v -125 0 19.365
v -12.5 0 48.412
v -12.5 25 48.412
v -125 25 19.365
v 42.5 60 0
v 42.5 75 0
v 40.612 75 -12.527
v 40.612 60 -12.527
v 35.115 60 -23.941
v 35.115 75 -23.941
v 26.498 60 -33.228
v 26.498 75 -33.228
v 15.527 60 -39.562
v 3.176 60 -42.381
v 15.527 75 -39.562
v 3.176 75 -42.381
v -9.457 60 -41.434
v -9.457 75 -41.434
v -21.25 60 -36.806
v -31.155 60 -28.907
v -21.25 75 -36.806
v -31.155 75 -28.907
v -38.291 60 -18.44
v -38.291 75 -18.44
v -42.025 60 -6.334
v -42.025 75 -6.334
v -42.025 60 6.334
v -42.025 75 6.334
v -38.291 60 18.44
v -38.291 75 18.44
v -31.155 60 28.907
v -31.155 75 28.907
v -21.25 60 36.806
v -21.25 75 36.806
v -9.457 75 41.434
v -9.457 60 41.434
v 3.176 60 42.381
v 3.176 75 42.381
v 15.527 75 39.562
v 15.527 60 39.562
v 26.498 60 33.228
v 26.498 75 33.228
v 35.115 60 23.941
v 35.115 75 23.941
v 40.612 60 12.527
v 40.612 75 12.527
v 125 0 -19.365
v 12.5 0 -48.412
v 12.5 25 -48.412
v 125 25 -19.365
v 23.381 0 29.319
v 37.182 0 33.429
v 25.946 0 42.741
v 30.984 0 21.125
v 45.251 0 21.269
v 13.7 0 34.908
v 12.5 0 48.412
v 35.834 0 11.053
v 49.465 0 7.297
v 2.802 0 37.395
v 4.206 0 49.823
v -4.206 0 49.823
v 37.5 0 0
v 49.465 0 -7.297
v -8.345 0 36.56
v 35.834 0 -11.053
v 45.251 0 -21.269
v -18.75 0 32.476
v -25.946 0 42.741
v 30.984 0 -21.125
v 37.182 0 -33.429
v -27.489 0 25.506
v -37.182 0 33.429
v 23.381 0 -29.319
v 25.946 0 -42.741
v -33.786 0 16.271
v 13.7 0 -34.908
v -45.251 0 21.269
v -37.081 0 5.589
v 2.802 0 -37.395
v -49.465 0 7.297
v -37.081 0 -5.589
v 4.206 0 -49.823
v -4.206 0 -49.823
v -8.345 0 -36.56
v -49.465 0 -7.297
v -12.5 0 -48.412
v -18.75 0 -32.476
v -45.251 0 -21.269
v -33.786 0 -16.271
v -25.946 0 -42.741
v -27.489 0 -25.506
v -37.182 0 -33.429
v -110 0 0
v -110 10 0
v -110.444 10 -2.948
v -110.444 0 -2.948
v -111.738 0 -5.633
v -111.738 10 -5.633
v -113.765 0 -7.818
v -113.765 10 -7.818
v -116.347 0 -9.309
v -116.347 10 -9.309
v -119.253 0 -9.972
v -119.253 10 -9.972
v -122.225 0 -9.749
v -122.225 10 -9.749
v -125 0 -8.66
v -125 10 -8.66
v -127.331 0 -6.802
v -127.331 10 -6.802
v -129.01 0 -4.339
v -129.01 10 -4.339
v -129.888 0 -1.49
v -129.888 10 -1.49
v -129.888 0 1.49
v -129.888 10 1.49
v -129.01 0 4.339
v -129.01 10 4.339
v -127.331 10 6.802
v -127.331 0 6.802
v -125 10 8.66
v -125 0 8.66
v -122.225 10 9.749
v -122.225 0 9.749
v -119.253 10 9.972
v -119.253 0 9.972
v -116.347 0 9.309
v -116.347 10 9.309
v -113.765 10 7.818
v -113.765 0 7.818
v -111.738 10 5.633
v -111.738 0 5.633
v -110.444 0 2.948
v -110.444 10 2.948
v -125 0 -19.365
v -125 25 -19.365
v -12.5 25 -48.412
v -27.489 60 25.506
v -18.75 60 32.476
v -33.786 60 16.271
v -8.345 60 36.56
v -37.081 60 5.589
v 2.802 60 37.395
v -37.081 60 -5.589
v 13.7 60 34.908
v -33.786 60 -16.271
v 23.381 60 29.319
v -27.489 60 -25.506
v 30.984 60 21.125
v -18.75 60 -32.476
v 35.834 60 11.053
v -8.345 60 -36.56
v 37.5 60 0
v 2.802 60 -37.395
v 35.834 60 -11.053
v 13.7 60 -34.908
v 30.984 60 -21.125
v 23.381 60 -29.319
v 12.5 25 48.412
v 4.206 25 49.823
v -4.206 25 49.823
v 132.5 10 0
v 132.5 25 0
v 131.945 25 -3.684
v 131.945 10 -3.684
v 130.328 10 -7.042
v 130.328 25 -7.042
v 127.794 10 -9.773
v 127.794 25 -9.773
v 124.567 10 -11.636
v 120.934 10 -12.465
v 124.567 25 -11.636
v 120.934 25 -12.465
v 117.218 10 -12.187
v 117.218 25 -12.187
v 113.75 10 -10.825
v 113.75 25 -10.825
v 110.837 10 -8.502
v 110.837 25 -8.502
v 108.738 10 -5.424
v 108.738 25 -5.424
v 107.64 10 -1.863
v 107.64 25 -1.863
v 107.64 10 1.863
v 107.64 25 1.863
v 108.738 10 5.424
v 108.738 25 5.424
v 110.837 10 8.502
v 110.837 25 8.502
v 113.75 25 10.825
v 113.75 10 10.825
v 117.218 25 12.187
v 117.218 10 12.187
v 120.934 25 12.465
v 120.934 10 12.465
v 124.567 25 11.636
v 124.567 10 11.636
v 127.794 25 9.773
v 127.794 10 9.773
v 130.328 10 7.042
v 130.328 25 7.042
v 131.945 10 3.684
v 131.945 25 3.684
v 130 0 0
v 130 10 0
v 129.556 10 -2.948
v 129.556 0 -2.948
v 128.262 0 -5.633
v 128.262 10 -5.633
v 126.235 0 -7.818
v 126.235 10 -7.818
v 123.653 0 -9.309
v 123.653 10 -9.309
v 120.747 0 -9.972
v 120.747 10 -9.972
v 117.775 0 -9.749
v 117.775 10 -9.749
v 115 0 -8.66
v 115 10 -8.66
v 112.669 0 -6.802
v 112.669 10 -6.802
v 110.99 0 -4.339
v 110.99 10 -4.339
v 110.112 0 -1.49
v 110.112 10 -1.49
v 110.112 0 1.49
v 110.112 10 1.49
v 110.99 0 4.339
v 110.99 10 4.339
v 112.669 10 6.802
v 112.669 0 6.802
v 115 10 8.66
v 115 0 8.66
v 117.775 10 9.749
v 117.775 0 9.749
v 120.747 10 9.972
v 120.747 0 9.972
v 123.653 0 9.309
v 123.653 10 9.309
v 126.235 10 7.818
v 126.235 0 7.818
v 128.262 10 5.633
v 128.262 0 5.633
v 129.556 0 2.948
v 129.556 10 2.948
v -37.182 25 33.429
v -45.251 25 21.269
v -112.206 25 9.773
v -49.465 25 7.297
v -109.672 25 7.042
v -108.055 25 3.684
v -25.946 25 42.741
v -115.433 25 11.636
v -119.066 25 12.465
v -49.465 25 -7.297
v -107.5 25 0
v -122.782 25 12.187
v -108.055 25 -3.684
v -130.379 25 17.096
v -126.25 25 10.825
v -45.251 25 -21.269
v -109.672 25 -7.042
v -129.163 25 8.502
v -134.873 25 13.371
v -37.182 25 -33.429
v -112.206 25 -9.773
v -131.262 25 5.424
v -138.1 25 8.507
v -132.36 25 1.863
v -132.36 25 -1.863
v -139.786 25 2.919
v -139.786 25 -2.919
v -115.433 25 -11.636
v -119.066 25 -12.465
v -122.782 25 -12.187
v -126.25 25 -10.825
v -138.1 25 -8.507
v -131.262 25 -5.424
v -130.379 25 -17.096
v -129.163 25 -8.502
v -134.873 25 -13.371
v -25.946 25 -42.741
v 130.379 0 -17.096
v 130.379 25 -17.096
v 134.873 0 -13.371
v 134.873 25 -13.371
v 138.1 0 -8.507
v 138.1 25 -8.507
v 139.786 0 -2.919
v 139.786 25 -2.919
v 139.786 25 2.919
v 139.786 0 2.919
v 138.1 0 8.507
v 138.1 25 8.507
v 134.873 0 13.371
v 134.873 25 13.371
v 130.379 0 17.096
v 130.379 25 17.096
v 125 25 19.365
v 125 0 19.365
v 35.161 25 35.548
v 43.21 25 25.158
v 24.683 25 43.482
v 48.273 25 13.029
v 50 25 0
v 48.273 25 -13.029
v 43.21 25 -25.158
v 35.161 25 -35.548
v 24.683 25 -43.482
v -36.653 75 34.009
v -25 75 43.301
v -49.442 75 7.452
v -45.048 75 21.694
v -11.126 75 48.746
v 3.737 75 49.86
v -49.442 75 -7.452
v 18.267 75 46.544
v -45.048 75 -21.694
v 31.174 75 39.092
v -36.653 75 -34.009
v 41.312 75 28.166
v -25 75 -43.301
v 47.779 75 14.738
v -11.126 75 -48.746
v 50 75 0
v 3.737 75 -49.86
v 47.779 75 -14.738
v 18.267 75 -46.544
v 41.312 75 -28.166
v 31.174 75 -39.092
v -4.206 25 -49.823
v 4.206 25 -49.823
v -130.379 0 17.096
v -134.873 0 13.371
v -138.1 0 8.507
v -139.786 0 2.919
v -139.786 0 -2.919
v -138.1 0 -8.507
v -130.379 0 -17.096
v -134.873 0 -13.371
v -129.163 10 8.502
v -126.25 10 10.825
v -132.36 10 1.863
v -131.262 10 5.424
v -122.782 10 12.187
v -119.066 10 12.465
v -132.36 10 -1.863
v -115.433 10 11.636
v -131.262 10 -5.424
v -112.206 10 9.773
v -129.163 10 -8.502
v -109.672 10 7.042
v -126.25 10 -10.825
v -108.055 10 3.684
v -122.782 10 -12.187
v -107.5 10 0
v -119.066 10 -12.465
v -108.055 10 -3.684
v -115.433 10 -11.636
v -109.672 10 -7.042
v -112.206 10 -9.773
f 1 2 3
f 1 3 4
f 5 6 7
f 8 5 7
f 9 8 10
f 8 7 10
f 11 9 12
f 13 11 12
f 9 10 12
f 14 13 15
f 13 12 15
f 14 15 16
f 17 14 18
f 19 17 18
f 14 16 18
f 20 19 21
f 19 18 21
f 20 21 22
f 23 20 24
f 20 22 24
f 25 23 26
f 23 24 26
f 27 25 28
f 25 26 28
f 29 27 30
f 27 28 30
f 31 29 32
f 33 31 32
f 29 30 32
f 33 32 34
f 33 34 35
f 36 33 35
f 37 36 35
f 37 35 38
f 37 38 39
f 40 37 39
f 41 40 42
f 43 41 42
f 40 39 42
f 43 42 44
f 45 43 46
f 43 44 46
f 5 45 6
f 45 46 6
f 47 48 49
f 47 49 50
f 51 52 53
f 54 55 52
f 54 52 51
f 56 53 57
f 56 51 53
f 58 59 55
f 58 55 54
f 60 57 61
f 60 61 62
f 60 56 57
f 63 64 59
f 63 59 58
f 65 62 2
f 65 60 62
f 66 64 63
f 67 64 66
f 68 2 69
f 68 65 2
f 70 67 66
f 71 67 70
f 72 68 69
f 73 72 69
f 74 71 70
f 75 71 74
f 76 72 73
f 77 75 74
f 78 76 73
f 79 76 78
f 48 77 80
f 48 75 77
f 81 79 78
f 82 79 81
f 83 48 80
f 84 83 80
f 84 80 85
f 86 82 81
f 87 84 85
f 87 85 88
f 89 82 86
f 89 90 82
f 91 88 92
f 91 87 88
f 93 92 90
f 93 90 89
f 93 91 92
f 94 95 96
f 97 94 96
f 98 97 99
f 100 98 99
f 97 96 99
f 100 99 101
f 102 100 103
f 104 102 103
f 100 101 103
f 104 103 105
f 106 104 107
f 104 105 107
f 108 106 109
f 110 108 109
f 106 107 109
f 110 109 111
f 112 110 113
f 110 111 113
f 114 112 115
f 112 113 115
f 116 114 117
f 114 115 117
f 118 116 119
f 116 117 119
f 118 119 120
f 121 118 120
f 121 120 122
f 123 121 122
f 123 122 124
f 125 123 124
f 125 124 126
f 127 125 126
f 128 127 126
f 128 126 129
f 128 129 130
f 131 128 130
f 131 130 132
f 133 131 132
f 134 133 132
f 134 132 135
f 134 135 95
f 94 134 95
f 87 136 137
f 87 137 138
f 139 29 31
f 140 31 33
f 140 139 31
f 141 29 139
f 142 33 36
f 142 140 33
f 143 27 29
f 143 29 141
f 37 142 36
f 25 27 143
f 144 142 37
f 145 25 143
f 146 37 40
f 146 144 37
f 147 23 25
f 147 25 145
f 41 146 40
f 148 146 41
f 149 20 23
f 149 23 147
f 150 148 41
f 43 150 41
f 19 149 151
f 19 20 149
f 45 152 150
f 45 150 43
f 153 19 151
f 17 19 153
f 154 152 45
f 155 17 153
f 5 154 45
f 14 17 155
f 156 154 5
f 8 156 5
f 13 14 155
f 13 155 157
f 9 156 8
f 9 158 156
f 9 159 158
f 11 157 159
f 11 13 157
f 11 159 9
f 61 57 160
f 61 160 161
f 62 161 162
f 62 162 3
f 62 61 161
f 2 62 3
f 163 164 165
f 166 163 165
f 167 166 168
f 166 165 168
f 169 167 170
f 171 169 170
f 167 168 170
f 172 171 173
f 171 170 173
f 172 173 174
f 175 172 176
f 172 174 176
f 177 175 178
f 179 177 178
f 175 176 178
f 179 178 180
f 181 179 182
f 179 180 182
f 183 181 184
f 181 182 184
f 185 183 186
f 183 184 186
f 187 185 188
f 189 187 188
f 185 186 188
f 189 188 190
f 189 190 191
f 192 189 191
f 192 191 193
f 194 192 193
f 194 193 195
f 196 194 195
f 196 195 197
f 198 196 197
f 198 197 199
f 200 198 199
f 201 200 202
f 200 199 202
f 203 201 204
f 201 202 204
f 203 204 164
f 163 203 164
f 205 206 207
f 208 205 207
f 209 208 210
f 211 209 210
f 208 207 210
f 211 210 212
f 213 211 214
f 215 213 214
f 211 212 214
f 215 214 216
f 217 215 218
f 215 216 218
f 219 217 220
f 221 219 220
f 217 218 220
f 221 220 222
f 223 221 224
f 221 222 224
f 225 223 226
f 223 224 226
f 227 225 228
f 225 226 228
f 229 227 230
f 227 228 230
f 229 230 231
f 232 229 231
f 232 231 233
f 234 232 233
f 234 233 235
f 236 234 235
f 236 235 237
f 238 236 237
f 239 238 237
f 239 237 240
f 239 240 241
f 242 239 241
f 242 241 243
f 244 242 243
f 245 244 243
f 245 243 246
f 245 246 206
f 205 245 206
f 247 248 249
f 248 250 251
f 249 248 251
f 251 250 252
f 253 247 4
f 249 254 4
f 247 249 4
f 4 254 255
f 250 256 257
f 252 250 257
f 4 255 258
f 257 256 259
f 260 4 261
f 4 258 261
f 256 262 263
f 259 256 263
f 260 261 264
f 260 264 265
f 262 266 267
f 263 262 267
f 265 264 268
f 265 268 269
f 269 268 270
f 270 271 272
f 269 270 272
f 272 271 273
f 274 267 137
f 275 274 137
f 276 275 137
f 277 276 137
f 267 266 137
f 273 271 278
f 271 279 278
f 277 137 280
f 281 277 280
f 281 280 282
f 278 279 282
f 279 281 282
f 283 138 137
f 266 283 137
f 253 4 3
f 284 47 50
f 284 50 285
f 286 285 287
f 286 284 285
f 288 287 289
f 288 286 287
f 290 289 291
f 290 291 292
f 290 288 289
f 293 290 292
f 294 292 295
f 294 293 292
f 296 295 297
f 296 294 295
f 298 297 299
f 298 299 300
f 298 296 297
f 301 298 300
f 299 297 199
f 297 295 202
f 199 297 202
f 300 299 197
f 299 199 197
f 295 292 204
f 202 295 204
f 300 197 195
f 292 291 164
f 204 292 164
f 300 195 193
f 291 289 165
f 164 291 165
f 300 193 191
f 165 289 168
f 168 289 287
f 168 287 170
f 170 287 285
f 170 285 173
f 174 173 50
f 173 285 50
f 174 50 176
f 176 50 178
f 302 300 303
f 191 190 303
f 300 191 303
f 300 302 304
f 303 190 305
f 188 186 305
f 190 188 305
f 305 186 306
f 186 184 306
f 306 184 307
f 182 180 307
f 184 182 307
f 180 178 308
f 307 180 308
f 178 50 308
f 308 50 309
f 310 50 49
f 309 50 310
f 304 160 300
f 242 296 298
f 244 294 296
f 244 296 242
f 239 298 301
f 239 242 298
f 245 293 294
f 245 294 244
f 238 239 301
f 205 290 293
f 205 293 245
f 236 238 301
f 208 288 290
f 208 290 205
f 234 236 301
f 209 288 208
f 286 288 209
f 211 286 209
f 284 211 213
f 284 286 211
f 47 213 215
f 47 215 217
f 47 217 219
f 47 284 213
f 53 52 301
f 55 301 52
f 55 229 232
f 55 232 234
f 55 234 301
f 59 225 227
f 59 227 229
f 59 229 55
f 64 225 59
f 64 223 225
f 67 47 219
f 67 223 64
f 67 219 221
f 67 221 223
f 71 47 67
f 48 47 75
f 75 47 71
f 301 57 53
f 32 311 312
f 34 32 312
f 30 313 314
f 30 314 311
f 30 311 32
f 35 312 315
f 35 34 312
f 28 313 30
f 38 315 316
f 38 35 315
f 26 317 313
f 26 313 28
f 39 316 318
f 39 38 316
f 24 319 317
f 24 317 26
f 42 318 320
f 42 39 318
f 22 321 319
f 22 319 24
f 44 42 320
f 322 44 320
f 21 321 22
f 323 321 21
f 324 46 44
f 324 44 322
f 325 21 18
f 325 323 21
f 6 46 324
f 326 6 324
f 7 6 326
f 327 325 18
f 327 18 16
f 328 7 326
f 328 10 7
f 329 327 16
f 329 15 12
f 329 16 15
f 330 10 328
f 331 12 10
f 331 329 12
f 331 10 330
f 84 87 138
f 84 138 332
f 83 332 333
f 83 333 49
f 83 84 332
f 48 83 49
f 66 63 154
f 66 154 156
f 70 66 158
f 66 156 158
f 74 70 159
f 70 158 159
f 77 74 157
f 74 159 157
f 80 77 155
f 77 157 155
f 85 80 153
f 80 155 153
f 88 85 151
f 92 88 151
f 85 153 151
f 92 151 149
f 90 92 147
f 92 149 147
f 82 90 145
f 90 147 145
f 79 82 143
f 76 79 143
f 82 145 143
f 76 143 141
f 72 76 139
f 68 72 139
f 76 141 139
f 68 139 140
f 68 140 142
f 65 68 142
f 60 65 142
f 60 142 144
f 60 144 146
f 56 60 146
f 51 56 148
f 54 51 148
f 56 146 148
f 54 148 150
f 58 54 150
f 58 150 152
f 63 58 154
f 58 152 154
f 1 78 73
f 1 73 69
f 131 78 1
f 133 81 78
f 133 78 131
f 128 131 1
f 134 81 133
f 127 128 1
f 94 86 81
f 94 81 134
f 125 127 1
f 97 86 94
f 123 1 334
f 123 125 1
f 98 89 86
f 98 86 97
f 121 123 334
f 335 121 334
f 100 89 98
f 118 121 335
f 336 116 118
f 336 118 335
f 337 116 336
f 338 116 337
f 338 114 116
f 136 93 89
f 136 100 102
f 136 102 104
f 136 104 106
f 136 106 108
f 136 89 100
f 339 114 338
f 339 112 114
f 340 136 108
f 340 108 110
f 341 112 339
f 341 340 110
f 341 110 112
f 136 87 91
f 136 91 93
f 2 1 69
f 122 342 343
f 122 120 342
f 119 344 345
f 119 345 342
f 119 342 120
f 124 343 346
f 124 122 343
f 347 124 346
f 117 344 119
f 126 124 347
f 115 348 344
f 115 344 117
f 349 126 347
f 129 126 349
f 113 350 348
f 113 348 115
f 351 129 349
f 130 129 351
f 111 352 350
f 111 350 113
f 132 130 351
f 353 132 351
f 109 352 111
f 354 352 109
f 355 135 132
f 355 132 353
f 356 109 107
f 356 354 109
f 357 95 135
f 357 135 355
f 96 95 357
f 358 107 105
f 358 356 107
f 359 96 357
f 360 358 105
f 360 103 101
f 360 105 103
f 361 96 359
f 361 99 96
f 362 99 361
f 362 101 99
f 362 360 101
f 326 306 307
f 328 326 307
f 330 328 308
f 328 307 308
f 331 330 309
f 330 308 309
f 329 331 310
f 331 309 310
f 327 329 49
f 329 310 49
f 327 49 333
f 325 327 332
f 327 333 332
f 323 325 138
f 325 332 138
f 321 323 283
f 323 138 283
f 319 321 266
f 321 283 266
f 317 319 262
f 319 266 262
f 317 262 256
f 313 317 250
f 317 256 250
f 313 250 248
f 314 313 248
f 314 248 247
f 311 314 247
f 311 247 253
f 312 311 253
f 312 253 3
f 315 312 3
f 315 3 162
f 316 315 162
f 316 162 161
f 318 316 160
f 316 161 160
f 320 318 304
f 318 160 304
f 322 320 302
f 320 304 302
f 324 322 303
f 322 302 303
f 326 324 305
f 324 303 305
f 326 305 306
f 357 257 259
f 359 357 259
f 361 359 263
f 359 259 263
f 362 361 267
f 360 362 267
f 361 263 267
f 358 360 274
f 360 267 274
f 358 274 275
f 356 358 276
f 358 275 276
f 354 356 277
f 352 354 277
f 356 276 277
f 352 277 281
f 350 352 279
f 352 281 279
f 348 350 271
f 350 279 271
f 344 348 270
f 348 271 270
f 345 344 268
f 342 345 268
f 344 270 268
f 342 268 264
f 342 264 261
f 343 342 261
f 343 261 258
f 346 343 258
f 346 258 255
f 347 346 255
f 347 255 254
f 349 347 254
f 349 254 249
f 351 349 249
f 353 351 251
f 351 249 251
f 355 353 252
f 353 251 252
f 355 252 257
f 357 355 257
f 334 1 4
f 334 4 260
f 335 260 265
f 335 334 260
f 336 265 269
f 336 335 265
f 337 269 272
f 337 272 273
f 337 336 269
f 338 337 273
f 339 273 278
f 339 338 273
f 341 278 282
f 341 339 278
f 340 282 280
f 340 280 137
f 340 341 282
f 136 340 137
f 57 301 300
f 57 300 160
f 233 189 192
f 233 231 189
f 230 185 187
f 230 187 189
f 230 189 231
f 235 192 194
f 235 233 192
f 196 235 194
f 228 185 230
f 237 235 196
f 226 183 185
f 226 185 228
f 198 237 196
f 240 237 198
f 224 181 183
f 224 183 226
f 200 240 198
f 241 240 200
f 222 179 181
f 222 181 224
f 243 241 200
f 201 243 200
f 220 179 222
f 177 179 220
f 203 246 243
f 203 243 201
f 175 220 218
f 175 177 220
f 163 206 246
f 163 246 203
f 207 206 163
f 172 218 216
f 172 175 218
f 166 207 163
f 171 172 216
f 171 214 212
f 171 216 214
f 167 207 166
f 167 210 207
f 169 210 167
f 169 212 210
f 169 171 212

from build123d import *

# Parameters (mm, degrees)
BOSS_EXTRUDE3_DEPTH = 25
SKETCH3_R           = 10
CUT_EXTRUDE1_DEPTH  = 25
SKETCH4_R           = 12.5
CUT_EXTRUDE2_DEPTH  = 15
SKETCH5_R           = 50
BOSS_EXTRUDE5_DEPTH = 75
SKETCH9_R           = 42.5
CUT_EXTRUDE5_DEPTH  = 15
SKETCH10_R          = 37.5
CUT_EXTRUDE6_DEPTH  = 60


with BuildPart() as part:
    # Sketch2 → Boss-Extrude3 (new body)
    with BuildSketch(Plane(origin=(0, 0, 0), x_dir=(1, 0, 0), z_dir=(0, 1, 0))):
        with BuildLine():
            Line((-125, 19.364916731), (-12.5, 48.412291828))
            ThreePointArc((-12.5, 48.412291828), (0, 50), (12.5, 48.412291828))
            Line((12.5, 48.412291828), (125, 19.364916731))
            ThreePointArc((125, 19.364916731), (140, 0), (125, -19.364916731))
            Line((125, -19.364916731), (12.5, -48.412291828))
            ThreePointArc((12.5, -48.412291828), (0, -50), (-12.5, -48.412291828))
            Line((-12.5, -48.412291828), (-125, -19.364916731))
            ThreePointArc((-125, -19.364916731), (-140, 0), (-125, 19.364916731))
        make_face()
    extrude(amount=BOSS_EXTRUDE3_DEPTH)

    # Sketch3 → Cut-Extrude1 (cut)
    with BuildSketch(Plane(origin=(0, 25, 0), x_dir=(1, 0, 0), z_dir=(0, 1, 0))):
        with Locations((-120, 0)):
            Circle(SKETCH3_R)
        with Locations((120, 0)):
            Circle(SKETCH3_R)
    extrude(amount=-CUT_EXTRUDE1_DEPTH, mode=Mode.SUBTRACT)

    # Sketch4 → Cut-Extrude2 (cut)
    with BuildSketch(Plane(origin=(0, 25, 0), x_dir=(1, 0, 0), z_dir=(0, 1, 0))):
        with Locations((-120, 0)):
            Circle(SKETCH4_R)
        with Locations((120, 0)):
            Circle(SKETCH4_R)
    extrude(amount=-CUT_EXTRUDE2_DEPTH, mode=Mode.SUBTRACT)

    # Sketch5 → Boss-Extrude5 (add)
    with BuildSketch(Plane(origin=(0, 0, 0), x_dir=(1, 0, 0), z_dir=(0, 1, 0))):
        Circle(SKETCH5_R)
    extrude(amount=BOSS_EXTRUDE5_DEPTH)

    # Sketch9 → Cut-Extrude5 (cut)
    with BuildSketch(Plane(origin=(0, 75, 0), x_dir=(1, 0, 0), z_dir=(0, 1, 0))):
        Circle(SKETCH9_R)
    extrude(amount=-CUT_EXTRUDE5_DEPTH, mode=Mode.SUBTRACT)

    # Sketch10 → Cut-Extrude6 (cut)
    with BuildSketch(Plane(origin=(0, 60, 0), x_dir=(1, 0, 0), z_dir=(0, 1, 0))):
        Circle(SKETCH10_R)
    extrude(amount=-CUT_EXTRUDE6_DEPTH, mode=Mode.SUBTRACT)


solid = part.part
